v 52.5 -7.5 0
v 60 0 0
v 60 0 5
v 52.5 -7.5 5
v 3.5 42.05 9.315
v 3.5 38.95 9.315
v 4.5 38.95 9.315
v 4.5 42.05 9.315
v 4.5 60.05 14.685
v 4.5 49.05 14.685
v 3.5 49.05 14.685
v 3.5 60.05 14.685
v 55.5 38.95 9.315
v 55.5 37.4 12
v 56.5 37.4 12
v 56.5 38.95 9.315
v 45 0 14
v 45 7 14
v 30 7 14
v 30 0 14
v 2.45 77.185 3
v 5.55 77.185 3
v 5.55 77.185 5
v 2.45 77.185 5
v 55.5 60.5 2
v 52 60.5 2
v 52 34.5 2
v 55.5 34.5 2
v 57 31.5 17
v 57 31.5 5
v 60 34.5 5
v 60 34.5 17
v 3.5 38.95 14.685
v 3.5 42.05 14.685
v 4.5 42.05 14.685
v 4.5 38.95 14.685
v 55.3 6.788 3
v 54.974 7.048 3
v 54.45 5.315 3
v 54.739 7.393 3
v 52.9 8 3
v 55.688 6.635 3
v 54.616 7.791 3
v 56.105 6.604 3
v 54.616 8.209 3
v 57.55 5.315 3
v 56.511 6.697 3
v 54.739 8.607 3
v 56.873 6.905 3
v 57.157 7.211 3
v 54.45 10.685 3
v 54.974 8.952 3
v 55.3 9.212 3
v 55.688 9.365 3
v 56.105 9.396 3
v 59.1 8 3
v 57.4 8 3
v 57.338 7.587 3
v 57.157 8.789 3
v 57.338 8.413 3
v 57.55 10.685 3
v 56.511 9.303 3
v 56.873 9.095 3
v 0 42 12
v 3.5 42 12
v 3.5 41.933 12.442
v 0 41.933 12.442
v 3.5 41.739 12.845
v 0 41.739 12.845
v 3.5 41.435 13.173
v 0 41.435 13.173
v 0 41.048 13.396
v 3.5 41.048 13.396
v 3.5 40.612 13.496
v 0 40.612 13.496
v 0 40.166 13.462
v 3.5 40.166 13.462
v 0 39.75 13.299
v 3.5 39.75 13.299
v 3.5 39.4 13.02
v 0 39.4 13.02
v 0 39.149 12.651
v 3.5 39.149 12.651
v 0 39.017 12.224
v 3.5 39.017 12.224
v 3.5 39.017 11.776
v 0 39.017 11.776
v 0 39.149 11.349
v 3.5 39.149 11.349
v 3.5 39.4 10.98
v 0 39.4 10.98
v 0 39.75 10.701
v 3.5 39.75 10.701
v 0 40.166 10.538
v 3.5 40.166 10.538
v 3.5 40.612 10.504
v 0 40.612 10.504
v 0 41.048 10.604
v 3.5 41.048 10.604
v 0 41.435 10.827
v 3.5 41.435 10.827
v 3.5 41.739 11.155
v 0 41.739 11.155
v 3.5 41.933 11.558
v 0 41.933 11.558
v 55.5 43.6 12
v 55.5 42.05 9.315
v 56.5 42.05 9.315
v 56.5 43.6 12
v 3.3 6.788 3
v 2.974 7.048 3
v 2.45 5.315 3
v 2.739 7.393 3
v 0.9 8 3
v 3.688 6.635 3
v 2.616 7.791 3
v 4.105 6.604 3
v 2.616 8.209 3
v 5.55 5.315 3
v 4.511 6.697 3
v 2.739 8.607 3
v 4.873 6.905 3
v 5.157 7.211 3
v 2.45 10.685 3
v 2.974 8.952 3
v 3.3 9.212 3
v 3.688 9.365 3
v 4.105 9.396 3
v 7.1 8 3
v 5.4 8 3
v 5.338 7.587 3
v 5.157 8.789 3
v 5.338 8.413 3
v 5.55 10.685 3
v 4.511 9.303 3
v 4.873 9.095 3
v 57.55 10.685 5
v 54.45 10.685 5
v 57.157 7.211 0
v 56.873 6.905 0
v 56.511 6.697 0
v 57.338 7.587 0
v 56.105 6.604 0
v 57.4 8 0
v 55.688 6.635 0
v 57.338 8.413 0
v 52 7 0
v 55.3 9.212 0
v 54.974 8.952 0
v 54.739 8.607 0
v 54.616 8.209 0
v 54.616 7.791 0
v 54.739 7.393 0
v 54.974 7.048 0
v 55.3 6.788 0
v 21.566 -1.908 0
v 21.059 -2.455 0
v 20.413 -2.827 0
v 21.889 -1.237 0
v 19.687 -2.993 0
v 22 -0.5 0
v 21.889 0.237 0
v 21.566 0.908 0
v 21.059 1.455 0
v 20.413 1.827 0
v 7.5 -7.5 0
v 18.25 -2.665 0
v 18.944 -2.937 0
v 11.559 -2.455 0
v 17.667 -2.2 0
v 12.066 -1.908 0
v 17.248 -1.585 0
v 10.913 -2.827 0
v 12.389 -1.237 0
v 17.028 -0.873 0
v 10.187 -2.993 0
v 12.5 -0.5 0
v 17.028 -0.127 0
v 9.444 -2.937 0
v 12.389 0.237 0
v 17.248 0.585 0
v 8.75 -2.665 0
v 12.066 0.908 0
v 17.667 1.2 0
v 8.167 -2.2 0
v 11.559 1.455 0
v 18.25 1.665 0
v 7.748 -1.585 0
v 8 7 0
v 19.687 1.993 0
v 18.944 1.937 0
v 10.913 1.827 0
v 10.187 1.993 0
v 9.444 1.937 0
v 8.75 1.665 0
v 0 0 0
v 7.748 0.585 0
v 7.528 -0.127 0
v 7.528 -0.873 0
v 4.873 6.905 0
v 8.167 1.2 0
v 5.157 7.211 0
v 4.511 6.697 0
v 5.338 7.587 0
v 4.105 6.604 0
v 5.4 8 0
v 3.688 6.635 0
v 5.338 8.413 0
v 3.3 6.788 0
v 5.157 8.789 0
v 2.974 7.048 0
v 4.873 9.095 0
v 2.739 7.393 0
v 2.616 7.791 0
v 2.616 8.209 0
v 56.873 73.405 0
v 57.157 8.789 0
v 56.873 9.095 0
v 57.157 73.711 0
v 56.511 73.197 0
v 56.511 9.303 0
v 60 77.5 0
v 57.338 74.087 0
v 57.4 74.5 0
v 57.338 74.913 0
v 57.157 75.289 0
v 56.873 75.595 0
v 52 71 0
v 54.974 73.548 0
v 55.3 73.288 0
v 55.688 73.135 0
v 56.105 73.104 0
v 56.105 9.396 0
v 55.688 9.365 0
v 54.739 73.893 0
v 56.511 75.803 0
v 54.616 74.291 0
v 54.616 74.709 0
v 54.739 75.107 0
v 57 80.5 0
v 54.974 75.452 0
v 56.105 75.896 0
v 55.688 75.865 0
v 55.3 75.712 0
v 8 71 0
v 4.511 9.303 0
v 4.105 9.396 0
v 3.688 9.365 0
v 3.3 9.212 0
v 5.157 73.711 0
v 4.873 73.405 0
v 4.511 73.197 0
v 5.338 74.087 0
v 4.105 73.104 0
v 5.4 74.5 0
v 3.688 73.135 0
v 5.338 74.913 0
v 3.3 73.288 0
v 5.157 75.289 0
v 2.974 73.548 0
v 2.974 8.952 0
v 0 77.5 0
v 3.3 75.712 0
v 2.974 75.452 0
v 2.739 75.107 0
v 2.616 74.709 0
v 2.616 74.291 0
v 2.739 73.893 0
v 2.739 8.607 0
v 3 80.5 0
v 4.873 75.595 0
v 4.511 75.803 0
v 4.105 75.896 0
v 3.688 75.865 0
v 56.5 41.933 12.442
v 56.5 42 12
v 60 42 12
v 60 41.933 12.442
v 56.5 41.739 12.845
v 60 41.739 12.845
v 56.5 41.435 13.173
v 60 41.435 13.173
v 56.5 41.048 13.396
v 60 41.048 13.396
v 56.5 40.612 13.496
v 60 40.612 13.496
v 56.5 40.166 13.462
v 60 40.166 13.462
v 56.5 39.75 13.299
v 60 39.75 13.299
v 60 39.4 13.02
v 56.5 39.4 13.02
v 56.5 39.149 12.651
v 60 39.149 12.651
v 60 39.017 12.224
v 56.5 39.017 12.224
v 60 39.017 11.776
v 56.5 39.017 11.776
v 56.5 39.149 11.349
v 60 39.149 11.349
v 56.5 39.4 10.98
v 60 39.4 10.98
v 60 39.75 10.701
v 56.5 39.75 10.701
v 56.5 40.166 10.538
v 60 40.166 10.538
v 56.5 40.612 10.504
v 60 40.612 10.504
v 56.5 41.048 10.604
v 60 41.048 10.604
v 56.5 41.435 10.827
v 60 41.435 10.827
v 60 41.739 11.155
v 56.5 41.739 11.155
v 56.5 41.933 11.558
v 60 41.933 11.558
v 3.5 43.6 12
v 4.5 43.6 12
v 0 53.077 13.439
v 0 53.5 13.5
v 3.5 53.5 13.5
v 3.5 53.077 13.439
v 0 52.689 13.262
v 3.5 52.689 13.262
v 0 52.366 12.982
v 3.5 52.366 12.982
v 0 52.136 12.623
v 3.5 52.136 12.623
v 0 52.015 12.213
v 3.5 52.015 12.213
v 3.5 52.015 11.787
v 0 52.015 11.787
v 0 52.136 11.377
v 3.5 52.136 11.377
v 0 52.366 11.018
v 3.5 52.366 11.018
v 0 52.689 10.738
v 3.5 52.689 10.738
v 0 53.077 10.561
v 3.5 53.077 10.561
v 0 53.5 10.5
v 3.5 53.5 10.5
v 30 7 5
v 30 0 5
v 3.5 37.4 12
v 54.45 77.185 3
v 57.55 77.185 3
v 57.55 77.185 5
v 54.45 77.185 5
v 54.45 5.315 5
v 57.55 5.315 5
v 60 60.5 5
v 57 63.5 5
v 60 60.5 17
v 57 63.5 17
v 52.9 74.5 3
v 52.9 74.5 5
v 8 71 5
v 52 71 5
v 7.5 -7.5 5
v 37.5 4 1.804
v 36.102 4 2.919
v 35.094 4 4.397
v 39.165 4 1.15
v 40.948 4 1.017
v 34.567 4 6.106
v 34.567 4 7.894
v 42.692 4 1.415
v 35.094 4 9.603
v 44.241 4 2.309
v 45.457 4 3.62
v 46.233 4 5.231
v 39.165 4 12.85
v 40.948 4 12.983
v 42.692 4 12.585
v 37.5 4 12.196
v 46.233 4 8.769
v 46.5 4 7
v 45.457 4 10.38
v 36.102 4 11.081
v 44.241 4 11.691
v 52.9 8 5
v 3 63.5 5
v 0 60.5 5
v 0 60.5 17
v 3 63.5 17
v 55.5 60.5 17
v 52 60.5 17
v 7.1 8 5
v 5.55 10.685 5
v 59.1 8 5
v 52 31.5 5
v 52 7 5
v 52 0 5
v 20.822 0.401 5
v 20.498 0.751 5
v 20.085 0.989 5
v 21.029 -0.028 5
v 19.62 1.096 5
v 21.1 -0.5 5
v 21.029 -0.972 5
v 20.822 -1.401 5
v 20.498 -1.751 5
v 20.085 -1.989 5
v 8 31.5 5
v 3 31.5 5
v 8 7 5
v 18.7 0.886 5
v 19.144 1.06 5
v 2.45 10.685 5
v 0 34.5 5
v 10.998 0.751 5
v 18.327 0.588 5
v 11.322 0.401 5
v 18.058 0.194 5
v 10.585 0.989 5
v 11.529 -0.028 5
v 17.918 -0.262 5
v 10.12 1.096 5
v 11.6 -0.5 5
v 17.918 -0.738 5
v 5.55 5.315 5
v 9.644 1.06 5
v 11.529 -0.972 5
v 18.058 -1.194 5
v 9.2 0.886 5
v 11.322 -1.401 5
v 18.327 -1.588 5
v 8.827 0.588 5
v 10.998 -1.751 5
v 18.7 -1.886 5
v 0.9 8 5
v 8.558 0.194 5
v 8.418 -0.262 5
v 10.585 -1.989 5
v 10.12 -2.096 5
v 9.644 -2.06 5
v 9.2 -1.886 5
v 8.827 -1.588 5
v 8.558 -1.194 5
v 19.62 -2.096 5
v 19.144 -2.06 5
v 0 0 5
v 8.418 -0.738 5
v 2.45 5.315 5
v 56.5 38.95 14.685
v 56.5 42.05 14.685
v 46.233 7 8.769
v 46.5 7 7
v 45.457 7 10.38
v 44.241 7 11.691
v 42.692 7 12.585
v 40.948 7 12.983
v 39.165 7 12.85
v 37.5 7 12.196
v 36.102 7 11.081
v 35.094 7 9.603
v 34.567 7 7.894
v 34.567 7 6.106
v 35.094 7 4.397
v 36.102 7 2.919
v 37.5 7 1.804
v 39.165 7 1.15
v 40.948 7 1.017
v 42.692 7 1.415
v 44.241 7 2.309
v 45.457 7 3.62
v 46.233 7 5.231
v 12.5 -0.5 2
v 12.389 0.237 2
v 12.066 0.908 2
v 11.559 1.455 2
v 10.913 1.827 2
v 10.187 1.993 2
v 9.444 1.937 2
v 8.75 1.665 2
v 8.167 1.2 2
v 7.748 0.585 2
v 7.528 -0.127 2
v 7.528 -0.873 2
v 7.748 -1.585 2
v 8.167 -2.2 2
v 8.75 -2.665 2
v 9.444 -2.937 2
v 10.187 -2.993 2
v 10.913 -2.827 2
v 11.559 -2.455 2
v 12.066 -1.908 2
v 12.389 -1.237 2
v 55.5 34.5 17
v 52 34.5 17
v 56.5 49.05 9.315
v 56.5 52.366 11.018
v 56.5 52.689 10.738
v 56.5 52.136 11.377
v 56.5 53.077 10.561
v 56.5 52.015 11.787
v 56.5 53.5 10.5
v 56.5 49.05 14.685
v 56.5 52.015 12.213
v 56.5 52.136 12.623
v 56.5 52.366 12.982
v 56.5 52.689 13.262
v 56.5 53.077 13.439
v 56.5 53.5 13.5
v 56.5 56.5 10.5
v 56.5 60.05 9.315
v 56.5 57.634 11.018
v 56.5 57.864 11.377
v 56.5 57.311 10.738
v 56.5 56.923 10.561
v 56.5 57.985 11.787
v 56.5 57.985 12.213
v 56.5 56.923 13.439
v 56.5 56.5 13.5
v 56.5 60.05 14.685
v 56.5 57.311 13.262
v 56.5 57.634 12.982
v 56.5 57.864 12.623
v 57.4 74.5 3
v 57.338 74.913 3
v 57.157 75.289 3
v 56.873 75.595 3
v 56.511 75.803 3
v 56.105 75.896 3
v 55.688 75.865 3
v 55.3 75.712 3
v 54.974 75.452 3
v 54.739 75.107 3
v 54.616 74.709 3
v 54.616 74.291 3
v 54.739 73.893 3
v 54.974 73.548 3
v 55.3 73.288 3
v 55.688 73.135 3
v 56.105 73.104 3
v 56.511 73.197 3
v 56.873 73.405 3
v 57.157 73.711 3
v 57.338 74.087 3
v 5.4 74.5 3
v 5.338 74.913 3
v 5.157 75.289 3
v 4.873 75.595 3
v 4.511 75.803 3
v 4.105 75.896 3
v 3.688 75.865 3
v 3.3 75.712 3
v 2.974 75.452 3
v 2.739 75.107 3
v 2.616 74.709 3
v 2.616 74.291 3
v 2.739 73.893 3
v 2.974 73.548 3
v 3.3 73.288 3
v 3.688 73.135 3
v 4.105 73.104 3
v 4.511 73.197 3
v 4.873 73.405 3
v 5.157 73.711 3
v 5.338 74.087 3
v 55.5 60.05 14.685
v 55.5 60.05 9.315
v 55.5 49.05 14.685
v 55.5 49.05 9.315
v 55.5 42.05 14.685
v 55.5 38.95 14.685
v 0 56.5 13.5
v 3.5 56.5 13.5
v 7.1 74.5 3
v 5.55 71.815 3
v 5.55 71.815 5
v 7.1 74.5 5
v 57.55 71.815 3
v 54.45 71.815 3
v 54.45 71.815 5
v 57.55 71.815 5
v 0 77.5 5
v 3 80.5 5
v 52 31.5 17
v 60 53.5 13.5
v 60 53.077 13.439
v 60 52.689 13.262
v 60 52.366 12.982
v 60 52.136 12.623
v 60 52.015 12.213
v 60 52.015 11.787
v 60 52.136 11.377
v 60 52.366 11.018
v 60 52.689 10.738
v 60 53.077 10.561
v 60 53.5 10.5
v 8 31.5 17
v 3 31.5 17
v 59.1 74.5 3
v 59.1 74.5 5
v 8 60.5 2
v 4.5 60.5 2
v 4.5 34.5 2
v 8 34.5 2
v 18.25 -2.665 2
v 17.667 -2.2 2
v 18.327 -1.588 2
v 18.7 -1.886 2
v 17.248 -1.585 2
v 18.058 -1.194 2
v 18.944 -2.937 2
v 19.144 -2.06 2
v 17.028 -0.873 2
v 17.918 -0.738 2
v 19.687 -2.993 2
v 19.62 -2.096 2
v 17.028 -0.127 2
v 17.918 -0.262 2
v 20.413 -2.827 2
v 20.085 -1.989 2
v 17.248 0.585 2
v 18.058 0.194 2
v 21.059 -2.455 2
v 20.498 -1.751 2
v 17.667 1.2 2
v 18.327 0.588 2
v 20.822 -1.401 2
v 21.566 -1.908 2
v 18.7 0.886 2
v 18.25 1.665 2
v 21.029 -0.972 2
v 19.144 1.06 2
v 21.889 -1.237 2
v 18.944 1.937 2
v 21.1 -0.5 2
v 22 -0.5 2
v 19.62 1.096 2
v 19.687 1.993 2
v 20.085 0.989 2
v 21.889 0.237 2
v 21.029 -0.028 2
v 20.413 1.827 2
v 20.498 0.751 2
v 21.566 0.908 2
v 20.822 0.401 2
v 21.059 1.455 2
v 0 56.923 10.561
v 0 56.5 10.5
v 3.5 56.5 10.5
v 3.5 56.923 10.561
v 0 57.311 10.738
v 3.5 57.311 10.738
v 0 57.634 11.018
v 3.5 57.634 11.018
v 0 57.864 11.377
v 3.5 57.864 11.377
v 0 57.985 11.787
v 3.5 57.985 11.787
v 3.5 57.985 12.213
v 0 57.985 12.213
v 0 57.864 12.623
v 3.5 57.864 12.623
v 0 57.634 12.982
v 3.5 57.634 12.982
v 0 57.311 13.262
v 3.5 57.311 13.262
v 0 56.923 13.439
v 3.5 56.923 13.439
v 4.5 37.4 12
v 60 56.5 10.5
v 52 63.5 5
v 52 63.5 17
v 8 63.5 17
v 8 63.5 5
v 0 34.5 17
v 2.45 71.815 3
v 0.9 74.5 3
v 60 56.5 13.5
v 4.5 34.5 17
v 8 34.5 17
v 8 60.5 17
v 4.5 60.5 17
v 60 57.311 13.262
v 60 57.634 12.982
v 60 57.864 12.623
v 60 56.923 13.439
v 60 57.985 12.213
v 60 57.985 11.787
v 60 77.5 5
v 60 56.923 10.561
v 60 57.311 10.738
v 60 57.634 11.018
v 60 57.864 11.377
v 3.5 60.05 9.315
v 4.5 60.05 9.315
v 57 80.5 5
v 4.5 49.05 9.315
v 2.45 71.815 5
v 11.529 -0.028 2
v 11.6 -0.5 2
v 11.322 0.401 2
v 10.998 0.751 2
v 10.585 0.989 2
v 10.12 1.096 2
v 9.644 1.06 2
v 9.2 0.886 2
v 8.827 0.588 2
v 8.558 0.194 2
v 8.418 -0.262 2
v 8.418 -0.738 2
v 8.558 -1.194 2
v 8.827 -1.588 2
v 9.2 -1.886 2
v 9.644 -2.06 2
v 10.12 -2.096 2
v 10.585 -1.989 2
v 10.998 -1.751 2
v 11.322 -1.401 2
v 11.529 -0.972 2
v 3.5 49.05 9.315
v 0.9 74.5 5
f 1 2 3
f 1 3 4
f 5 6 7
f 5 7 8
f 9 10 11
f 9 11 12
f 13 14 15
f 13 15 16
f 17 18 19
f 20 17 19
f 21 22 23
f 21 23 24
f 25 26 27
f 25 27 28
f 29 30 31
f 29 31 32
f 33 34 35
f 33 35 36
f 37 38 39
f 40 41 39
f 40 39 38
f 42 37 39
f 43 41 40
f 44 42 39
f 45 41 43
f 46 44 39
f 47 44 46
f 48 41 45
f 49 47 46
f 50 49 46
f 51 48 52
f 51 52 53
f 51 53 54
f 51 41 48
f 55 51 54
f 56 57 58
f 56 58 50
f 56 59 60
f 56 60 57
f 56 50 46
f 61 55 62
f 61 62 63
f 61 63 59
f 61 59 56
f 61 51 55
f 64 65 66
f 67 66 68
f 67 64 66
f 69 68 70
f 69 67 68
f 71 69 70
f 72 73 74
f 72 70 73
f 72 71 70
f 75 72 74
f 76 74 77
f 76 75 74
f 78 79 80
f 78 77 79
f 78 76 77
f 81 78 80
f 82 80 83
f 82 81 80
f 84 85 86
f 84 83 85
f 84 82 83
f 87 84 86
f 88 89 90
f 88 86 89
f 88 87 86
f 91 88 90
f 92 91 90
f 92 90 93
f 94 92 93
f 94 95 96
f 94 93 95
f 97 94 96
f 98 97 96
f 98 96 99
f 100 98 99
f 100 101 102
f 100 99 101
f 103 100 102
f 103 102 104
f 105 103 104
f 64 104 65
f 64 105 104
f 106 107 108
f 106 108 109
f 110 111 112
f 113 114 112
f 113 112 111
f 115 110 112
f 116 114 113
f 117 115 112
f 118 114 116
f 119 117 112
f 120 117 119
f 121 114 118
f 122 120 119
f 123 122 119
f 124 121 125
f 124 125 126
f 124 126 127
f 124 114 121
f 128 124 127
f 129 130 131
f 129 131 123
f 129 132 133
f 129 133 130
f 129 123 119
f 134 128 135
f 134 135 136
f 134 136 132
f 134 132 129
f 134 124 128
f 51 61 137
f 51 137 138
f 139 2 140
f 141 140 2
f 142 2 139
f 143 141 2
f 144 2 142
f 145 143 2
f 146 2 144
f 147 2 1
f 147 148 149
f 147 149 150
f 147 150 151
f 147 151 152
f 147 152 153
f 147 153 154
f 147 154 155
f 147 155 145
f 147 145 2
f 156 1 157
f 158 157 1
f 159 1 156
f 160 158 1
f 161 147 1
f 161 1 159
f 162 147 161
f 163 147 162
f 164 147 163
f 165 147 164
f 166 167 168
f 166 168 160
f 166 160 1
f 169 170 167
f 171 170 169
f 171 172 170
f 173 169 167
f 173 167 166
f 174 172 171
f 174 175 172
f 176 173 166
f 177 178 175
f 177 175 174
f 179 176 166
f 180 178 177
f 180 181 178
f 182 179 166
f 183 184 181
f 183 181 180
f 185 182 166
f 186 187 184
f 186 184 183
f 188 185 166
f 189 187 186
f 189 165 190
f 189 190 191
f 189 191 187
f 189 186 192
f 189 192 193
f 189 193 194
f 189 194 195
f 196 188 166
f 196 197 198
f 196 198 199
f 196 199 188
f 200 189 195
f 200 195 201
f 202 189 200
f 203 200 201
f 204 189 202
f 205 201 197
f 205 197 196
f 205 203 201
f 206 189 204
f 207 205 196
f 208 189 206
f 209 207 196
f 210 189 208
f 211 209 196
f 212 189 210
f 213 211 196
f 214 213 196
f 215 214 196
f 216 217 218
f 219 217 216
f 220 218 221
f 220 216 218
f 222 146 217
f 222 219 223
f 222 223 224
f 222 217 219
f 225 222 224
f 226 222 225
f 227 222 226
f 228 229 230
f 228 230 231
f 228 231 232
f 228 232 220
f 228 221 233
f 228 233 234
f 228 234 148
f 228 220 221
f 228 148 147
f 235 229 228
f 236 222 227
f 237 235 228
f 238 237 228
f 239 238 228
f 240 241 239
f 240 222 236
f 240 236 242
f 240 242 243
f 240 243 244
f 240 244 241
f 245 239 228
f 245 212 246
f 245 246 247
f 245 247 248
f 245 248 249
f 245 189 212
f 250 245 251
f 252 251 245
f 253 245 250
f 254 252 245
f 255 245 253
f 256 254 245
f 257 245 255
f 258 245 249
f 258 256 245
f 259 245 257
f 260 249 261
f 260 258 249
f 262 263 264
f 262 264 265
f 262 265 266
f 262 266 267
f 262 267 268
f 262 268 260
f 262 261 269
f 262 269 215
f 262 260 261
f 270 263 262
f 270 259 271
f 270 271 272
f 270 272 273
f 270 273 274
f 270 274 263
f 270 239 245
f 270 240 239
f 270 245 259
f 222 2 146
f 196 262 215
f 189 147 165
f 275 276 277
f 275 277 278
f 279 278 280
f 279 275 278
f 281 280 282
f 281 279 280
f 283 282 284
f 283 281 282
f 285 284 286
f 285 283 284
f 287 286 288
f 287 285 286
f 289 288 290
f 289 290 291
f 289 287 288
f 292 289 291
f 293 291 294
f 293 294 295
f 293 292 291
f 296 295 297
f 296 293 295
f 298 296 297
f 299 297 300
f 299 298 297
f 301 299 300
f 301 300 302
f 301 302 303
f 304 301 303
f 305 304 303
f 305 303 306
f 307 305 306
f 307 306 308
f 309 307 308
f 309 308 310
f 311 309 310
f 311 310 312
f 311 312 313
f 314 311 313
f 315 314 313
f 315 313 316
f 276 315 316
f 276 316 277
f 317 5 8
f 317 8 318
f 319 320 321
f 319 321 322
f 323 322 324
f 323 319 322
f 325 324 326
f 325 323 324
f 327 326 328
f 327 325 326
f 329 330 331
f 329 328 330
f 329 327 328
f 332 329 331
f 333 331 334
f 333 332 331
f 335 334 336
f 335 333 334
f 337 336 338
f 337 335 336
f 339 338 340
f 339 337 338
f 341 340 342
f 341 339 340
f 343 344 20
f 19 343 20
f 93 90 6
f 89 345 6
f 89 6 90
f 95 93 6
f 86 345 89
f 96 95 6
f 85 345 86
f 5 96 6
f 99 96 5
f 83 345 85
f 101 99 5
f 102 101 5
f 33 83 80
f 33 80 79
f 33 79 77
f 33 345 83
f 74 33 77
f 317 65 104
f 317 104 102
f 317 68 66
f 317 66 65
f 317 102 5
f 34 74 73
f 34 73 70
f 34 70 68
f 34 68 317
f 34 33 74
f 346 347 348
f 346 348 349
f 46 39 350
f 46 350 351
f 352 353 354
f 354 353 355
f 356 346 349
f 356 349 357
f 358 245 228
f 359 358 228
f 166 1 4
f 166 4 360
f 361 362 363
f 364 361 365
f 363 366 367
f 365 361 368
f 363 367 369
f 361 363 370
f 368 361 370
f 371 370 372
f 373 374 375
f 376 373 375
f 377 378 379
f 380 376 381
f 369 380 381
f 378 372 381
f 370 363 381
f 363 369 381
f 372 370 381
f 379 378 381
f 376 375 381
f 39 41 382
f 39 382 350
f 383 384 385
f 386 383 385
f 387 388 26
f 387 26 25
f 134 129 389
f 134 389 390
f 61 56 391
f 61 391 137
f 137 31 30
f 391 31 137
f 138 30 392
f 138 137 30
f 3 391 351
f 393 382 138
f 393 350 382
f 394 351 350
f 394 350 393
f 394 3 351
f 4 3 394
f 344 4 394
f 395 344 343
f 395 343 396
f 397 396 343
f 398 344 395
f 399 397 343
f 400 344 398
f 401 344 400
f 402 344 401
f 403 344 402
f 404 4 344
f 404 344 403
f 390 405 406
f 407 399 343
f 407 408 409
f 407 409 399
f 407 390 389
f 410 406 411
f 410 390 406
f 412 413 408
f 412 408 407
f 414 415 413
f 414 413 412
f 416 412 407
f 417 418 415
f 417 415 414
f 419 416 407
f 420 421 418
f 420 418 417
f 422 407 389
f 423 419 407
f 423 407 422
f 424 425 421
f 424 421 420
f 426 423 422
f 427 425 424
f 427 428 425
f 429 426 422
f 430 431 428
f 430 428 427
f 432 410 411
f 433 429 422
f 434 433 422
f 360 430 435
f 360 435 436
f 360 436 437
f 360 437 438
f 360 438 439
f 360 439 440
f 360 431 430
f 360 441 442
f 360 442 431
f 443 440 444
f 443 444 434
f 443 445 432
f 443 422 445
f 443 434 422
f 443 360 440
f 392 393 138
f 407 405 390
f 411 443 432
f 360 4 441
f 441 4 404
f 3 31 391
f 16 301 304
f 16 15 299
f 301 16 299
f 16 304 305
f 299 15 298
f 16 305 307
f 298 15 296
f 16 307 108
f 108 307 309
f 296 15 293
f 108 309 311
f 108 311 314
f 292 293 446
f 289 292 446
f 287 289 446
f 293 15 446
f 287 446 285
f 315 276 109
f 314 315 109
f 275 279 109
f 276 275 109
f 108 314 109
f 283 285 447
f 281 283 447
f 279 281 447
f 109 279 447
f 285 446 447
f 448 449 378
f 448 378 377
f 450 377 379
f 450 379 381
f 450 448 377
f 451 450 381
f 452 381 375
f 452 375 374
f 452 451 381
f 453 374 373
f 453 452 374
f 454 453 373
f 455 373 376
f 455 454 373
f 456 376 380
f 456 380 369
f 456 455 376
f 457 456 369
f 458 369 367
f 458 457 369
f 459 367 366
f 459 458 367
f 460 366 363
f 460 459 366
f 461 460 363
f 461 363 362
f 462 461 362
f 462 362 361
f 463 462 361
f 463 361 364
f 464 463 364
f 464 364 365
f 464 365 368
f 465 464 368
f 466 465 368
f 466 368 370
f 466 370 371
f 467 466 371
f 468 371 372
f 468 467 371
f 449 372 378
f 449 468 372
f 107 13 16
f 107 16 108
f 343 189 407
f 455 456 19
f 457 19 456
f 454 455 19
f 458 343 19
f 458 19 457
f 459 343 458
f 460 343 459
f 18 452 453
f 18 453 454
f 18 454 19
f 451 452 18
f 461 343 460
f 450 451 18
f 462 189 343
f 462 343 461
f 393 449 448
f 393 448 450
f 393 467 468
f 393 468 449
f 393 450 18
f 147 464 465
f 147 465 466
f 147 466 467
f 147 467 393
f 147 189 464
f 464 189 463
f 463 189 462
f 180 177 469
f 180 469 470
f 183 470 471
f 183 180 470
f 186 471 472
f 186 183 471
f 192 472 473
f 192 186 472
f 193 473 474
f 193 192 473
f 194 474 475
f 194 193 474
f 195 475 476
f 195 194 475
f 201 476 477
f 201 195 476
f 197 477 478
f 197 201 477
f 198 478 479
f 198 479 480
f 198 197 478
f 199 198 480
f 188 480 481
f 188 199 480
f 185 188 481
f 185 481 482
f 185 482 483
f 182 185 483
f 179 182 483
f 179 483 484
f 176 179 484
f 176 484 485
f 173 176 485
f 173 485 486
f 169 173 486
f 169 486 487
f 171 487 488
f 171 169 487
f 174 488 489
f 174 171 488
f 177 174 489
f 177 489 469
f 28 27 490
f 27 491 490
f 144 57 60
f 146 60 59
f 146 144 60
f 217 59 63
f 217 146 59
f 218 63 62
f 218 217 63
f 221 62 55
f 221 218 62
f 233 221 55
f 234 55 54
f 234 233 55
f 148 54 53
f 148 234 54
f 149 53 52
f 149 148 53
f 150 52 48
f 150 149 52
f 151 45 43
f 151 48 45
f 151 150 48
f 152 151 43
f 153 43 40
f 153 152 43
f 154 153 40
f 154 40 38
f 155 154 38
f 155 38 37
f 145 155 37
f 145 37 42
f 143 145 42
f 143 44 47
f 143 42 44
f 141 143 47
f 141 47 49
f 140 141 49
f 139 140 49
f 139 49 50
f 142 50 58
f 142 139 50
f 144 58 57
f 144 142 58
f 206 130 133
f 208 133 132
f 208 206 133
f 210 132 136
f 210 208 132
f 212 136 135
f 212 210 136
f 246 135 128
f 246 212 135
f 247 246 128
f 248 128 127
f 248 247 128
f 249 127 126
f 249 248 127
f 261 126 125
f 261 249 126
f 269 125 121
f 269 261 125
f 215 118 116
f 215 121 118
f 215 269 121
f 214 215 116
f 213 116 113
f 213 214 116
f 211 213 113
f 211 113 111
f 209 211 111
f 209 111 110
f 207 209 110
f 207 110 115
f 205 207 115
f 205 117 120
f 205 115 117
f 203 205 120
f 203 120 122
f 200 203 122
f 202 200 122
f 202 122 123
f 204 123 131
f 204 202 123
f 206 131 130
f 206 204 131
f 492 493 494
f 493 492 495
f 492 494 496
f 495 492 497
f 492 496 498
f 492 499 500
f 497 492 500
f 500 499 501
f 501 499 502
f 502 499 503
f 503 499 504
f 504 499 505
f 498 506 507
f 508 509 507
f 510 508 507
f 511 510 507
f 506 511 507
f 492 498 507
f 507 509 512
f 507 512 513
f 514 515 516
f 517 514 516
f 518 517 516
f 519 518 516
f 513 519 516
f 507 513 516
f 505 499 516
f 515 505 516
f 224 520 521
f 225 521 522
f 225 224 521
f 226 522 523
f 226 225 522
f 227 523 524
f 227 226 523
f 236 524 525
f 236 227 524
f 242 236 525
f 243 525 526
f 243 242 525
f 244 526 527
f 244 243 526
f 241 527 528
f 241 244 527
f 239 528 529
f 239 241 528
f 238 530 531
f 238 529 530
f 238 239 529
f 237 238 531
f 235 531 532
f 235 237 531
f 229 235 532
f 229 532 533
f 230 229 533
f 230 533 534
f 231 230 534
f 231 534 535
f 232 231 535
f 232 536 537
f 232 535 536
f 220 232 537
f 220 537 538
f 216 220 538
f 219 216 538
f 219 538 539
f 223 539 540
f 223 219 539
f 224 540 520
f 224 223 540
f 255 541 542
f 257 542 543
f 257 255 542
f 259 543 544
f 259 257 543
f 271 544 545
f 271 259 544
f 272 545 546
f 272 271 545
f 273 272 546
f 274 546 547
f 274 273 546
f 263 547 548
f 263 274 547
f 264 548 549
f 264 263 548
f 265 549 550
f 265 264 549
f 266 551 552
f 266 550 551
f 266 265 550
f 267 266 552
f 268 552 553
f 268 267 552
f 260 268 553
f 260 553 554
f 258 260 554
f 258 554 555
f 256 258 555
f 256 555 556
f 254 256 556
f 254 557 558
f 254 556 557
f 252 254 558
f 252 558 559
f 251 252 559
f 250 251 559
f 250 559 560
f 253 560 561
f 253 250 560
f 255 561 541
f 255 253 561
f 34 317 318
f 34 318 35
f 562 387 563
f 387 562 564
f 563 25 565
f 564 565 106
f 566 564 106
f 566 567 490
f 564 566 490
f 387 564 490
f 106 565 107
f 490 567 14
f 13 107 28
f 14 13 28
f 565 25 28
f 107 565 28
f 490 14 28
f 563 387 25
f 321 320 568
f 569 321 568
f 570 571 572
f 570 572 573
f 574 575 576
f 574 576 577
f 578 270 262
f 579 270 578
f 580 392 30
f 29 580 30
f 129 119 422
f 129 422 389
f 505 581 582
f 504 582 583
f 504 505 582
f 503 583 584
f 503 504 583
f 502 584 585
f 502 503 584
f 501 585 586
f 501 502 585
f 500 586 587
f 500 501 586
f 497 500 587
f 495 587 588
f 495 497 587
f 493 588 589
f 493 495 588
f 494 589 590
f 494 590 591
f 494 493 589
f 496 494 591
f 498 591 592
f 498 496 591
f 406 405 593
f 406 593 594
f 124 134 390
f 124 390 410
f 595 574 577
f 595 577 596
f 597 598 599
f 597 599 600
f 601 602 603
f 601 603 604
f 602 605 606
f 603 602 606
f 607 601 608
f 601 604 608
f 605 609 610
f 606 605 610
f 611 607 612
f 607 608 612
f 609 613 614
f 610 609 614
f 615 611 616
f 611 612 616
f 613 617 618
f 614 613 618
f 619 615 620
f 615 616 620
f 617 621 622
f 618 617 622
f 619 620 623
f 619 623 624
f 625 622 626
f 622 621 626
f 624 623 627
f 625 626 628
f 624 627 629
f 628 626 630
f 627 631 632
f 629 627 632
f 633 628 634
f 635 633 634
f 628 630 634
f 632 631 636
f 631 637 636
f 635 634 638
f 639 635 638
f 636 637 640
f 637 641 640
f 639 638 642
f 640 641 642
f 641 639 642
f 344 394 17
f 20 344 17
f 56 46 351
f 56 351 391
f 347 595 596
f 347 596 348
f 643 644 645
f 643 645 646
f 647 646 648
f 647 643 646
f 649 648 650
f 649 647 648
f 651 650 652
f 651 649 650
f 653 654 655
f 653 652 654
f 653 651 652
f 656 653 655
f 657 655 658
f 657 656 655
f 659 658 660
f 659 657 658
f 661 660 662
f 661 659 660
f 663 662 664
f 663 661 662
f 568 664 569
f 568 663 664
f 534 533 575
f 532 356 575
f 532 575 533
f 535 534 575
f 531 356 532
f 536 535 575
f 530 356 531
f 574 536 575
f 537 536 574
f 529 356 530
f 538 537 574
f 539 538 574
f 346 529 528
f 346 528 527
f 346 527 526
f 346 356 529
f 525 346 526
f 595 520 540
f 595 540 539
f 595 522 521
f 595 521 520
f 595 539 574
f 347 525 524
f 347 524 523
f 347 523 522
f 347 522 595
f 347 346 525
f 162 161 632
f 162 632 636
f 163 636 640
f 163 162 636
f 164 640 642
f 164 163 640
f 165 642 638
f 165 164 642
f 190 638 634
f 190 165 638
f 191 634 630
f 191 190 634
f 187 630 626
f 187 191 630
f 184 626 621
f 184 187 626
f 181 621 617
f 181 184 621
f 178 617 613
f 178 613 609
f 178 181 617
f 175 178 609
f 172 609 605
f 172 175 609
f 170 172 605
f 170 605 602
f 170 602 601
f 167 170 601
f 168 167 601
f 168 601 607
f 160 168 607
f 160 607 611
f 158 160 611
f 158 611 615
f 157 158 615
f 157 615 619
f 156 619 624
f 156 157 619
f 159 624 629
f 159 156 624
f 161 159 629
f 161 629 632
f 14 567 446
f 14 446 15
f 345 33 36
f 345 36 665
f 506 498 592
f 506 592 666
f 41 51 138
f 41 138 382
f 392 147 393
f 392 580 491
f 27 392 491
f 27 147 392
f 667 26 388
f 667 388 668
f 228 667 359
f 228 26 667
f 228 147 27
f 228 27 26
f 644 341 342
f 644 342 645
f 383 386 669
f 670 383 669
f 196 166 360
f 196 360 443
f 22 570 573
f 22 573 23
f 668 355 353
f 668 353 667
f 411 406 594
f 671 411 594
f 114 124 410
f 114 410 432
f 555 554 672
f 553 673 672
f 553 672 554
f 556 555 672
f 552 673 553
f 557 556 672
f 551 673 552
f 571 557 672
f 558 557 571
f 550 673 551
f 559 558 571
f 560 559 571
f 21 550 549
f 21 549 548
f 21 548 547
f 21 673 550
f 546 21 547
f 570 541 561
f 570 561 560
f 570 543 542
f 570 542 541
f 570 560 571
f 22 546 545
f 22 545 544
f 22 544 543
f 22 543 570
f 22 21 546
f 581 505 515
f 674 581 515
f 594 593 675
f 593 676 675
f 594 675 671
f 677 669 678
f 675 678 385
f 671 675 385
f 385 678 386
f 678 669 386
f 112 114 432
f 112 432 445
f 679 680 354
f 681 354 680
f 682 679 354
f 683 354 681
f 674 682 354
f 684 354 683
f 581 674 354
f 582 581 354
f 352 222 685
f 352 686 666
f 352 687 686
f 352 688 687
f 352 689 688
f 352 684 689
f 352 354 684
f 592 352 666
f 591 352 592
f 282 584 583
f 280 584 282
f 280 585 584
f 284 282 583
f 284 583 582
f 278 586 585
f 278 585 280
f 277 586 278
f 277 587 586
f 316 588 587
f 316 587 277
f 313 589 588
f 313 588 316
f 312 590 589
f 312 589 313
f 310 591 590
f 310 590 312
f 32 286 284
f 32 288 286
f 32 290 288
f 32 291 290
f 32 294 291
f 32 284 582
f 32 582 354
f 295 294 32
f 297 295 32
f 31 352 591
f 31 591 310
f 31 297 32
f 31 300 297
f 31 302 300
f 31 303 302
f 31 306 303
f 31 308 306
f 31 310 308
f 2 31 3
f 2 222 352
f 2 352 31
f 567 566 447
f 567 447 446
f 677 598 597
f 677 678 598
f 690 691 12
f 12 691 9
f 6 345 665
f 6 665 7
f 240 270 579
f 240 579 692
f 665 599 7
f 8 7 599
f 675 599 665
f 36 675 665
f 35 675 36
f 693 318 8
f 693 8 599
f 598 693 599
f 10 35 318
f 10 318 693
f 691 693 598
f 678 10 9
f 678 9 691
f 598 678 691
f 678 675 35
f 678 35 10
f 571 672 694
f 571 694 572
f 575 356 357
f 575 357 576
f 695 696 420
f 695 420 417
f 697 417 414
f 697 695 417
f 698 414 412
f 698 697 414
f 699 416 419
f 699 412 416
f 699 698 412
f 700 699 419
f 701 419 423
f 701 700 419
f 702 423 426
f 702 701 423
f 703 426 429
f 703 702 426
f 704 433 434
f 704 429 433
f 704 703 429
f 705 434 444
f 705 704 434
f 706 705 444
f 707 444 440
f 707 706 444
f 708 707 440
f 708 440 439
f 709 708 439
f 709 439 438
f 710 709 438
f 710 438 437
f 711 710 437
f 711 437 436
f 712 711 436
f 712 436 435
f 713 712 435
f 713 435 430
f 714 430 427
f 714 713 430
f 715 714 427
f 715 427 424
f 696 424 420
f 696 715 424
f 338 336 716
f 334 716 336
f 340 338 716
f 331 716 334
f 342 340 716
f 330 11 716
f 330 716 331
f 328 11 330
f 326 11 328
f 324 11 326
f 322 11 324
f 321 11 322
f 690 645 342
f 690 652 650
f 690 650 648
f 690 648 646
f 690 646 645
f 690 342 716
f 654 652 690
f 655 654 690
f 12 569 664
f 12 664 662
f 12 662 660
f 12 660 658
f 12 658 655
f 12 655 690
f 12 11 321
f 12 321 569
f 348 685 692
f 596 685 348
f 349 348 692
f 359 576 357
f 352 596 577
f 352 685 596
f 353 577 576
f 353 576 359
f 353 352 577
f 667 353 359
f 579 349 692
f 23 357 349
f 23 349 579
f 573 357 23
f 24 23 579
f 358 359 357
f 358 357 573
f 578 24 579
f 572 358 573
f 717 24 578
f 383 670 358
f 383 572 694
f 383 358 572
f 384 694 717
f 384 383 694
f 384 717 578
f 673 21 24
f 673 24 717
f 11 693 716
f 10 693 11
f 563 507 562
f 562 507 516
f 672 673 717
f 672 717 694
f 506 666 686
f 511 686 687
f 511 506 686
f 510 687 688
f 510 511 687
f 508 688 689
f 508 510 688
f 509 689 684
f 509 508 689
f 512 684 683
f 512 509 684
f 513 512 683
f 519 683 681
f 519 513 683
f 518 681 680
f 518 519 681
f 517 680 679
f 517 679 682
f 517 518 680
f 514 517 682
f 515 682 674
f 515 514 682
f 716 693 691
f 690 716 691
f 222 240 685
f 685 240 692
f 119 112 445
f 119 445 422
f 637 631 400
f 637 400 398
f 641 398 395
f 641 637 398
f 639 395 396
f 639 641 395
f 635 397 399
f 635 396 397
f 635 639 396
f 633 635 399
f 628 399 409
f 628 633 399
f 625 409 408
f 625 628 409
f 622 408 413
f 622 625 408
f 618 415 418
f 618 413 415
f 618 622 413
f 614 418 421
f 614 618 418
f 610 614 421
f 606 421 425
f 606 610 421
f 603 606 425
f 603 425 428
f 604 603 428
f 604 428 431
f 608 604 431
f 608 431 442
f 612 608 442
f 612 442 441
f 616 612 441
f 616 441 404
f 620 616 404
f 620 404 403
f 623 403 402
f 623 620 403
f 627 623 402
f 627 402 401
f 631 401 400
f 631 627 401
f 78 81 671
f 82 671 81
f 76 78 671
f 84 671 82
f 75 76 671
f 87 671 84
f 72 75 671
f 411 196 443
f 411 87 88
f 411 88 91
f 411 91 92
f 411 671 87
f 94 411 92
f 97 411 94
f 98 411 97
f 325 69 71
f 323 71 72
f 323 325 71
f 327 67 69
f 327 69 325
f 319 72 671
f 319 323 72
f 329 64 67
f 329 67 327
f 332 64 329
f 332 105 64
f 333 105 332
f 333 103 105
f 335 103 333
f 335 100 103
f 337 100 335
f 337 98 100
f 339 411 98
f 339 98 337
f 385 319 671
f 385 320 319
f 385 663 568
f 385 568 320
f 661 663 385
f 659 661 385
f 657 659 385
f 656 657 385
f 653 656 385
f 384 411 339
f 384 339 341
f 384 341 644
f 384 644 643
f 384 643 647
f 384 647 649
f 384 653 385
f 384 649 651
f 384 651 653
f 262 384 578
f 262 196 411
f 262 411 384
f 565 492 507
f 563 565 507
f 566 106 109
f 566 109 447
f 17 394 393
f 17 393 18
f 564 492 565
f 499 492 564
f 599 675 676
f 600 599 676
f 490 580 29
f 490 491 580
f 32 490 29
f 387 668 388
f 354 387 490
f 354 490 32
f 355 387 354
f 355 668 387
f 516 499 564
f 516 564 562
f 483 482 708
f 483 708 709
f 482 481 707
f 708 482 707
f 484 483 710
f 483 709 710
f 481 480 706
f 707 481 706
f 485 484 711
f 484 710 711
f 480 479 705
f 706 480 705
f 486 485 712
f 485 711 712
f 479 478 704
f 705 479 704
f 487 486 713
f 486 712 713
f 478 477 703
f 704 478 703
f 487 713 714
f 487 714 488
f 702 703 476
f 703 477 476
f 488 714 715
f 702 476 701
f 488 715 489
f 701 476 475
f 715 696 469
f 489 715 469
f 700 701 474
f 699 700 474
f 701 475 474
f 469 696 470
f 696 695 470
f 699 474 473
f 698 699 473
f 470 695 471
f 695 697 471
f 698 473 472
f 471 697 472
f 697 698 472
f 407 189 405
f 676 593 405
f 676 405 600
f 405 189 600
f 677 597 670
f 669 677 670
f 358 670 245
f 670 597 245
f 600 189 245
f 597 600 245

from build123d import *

# Parameters (mm, degrees)
SKETCH021_W  = 22
SKETCH021_H  = 12.704962
PAD014_DEPTH = 10
SKETCH020_R  = 2.5
PAD013_DEPTH = 2
SKETCH015_R  = 1.5
PAD008_DEPTH = 60
SKETCH019_R  = 1.6
PAD012_DEPTH = 5
PAD005_DEPTH = 2
SKETCH018_W  = 11
SKETCH018_H  = 5.369358
PAD011_DEPTH = 26.5
SKETCH022_W  = 21.583895
SKETCH022_H  = 15.194446
PAD015_DEPTH = 60
SKETCH010_R  = 6
PAD003_DEPTH = 3
SKETCH009_W  = 30
SKETCH009_H  = 9
PAD002_DEPTH = 80.5
SKETCH008_R  = 1.4
PAD001_DEPTH = 14
SKETCH013_W  = 3.5
SKETCH013_H  = 26
PAD006_DEPTH = 3
SKETCH_W     = 44
SKETCH_H     = 64
PAD_DEPTH    = 14
PAD007_DEPTH = 12
CHAMFER_SIZE = 3


with BuildPart() as pad014:
    # Sketch021 → Pad014 (new body)
    with BuildSketch(Plane.XZ.offset(-81)):
        with Locations((41, 11.352481)):
            Rectangle(SKETCH021_W, SKETCH021_H)
    extrude(amount=PAD014_DEPTH)


with BuildPart() as endtopflush:
    # Sketch020 → Pad013 (new body)
    with BuildSketch(Plane.XY):
        with Locations((10, -0.5)):
            Circle(SKETCH020_R)
        with Locations((19.5, -0.5)):
            Circle(SKETCH020_R)
    extrude(amount=PAD013_DEPTH)


with BuildPart() as betltensmount:
    # Sketch015 → Pad008 (new body)
    with BuildSketch(Plane.YZ):
        with Locations((40.5, 12)):
            Circle(SKETCH015_R)
        with BuildLine():
            ThreePointArc((53.5, 13.5), (52, 12), (53.5, 10.5))
            Line((53.5, 10.5), (56.5, 10.5))
            ThreePointArc((56.5, 10.5), (58, 12), (56.5, 13.5))
            Line((53.5, 13.5), (56.5, 13.5))
        make_face()
    extrude(amount=PAD008_DEPTH)


with BuildPart() as endstopmount:
    # Sketch019 → Pad012 (new body)
    with BuildSketch(Plane.XY):
        with Locations((10, -0.5)):
            Circle(SKETCH019_R)
        with Locations((19.5, -0.5)):
            Circle(SKETCH019_R)
    extrude(amount=PAD012_DEPTH)


with BuildPart() as nutflush:
    # Sketch006 → Pad005 (new body)
    with BuildSketch(Plane(origin=(0, -9.25, 3), x_dir=(1, 0, 0), z_dir=(0, 0, 1))):
        Polygon((5.55, 86.434679), (2.45, 86.434679), (0.9, 83.75), (2.45, 81.065321), (5.55, 81.065321), (7.1, 83.75), align=None)
        Polygon((57.55, 81.065321), (59.1, 83.75), (57.55, 86.434679), (54.45, 86.434679), (52.9, 83.75), (54.45, 81.065321), align=None)
        Polygon((0.9, 17.25), (2.45, 14.565321), (5.55, 14.565321), (7.1, 17.25), (5.55, 19.934679), (2.45, 19.934679), align=None)
        Polygon((52.9, 17.25), (54.45, 14.565321), (57.55, 14.565321), (59.1, 17.25), (57.55, 19.934679), (54.45, 19.934679), align=None)
    extrude(amount=PAD005_DEPTH)


with BuildPart() as belttensionflush:
    # Sketch018 → Pad011 (new body, symmetric)
    with BuildSketch(Plane.YZ.offset(30)):
        Polygon((42.05, 9.315321), (43.6, 12), (42.05, 14.684679), (38.95, 14.684679), (37.4, 12), (38.95, 9.315321), align=None)
        with Locations((54.55, 12)):
            Rectangle(SKETCH018_W, SKETCH018_H)
    extrude(amount=PAD011_DEPTH, both=True)


with BuildPart() as cutblock02:
    # Sketch022 → Pad015 (new body)
    with BuildSketch(Plane.YZ):
        with Locations((-10.791947, 12.597223)):
            Rectangle(SKETCH022_W, SKETCH022_H)
    extrude(amount=PAD015_DEPTH)

    # Fusion002: union Pad014, EndtopFlush, BetlTensMount, EndstopMount, NutFlush, BeltTensionFlush
    add(pad014.part)
    add(endtopflush.part)
    add(betltensmount.part)
    add(endstopmount.part)
    add(nutflush.part)
    add(belttensionflush.part)


with BuildPart() as springhole:
    # Sketch010 → Pad003 (new body)
    with BuildSketch(Plane.XZ.offset(-7)):
        with Locations((40.5, 7)):
            Circle(SKETCH010_R)
    extrude(amount=PAD003_DEPTH)


with BuildPart() as profile:
    # Sketch009 → Pad002 (new body)
    with BuildSketch(Plane.XZ):
        with Locations((15, 9.5)):
            Rectangle(SKETCH009_W, SKETCH009_H)
        Polygon((52, 5), (45, 14), (60, 14), (60, 5), align=None)
    extrude(amount=-PAD002_DEPTH)


with BuildPart() as mounthole:
    # Sketch008 → Pad001 (new body)
    with BuildSketch(Plane.XY):
        with Locations((4, 8)):
            Circle(SKETCH008_R)
        with Locations((56, 8)):
            Circle(SKETCH008_R)
        with Locations((4, 74.5)):
            Circle(SKETCH008_R)
        with Locations((56, 74.5)):
            Circle(SKETCH008_R)
    extrude(amount=PAD001_DEPTH)


with BuildPart() as cutblocks:
    # Sketch013 → Pad006 (new body)
    with BuildSketch(Plane.XY.offset(5)):
        with Locations((6.25, 47.5)):
            Rectangle(SKETCH013_W, SKETCH013_H)
        with Locations((53.75, 47.5)):
            Rectangle(SKETCH013_W, SKETCH013_H)
    extrude(amount=-PAD006_DEPTH)

    # Fusion001: union SpringHole, Profile, MountHole
    add(springhole.part)
    add(profile.part)
    add(mounthole.part)


with BuildPart() as cut:
    # Sketch → Pad (new body)
    with BuildSketch(Plane.XY):
        Polygon((60, 80.5), (60, 0), (52.5, -7.5), (7.5, -7.5), (0, 0), (0, 80.5), align=None)
        with Locations((30, 39)):
            Rectangle(SKETCH_W, SKETCH_H, mode=Mode.SUBTRACT)
    extrude(amount=PAD_DEPTH)

    # Cut: cut CutBlocks
    add(cutblocks.part, mode=Mode.SUBTRACT)


with BuildPart() as chamfer_body:
    # Sketch014 → Pad007 (new body)
    with BuildSketch(Plane.XY.offset(5)):
        Polygon((4.5, 60.5), (4.5, 34.5), (8, 34.5), (8, 31.5), (0, 31.5), (0, 63.5), (8, 63.5), (8, 60.5), align=None)
        Polygon((55.5, 60.5), (55.5, 34.5), (52, 34.5), (52, 31.5), (60, 31.5), (60, 63.5), (52, 63.5), (52, 60.5), align=None)
    extrude(amount=PAD007_DEPTH)

    # Fusion: union Cut
    add(cut.part)

    # Cut001: cut CutBlock02
    add(cutblock02.part, mode=Mode.SUBTRACT)

    # Chamfer
    chamfer_edges = [chamfer_body.edges().sort_by_distance(p)[0] for p in [
        (0, 80.5, 2.5),
        (0, 63.5, 11),
        (60, 63.5, 11),
        (60, 80.5, 2.5),
        (0, 31.5, 11),
        (60, 31.5, 11),
    ]]
    chamfer(chamfer_edges, length=CHAMFER_SIZE)


solid = chamfer_body.part
